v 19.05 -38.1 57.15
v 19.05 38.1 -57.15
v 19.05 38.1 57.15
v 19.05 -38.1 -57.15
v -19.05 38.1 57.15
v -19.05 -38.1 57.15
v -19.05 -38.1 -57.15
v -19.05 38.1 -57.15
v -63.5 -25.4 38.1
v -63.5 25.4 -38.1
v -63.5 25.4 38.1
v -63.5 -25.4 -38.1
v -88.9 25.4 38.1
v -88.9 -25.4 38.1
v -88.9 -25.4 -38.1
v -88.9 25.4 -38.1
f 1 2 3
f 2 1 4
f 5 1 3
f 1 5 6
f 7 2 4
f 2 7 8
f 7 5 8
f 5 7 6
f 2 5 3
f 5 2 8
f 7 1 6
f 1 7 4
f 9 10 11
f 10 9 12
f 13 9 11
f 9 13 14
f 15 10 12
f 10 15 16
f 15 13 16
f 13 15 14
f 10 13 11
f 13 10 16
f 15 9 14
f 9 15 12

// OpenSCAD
// file: ../lib/TOGUnitTable-v1.scad
// TOGUnitTable-v1.0.0 - Library for handling 'complex amounts' in the form of [multiplier, unit name], e.g. [1.5, "inch"]
//
// 2023-07-01: the following 'annotation' is something I just made up,
// but is intended as a way for future packaging tools to know that it's 'safe'
// (because everything has been somewhat namespaced) to turn a `use <x>`
// into an `include <x>`, making it inlinable:
// safe-to-include: true
// 
// Versions:
// v1.0.0:
// - Created it.
// 
// Naming convention:
// Doing 'OO without classes', here.
// Fully qualified name = class or package name + "__" + member name
// Class or package name may itself be namespaced, and class names may double as package names.
// Here, tog_unittable names both a class and a package.

// Demo unit table uses 'micrometer' as the base unit
// in order to keep multipliers as integers as much as possible.
tog_unittable__demo_unit_table = [
	["um",    [    1   ,   "um"], "micrometer" ],
	["mm",    [ 1000   ,   "um"], "millimeter" ],
	["inch",  [25400   ,   "um"], "inch"       ],
	["u",     [    1/16, "inch"], "model unit" ], // As used by TGx9 et al
	["atom",  [    8   ,    "u"], "model atom" ],
	["chunk", [    3   , "atom"], "model chunk"],
];

function tog_unittable__list__filter(list, predicate) = [
	for( item=list ) if( predicate(item) ) item
];
function tog_unittable__list__first(list, on_error) =
	len(list) > 0 ? list[0] : on_error();

function tog_unittable__unit_value_ca(unit_table, unit_name) =
	tog_unittable__list__first(
		tog_unittable__list__filter(unit_table, function (entry) entry[0] == unit_name),
		function () assert(false, str("Did not find entry for unit '", unit_name, "' in unit table")))[1];

function tog_unittable__ca__is_valid( ca ) =
	is_list(ca) && len(ca) == 2;

// Break down 'amount' until it is in a base unit (one which is defined in terms of itself)
function tog_unittable__simplify_ca(unit_table, amount) =
	assert( tog_unittable__ca__is_valid(amount), str(amount, " is not a valid Complex Amount (should be [numeric_value, \"unit_name\"])") )
	let( unit_value_ca = tog_unittable__unit_value_ca(unit_table, amount[1]) )
	unit_value_ca[1] == amount[1] ? amount :
		tog_unittable__simplify_ca(unit_table, [amount[0] * unit_value_ca[0], unit_value_ca[1]]);

function tog_unittable__divide_ca(unit_table, numerator, denominator) =
	let(
		numerator_base_ca   = tog_unittable__simplify_ca(unit_table, numerator),
		denominator_base_ca = tog_unittable__simplify_ca(unit_table, denominator)
	)
	assert(numerator_base_ca[1] == denominator_base_ca[1], str("Different base units found for ", numerator[1], " and ", denominator[1]))
	numerator_base_ca[0] / denominator_base_ca[0];	

assert(tog_unittable__divide_ca(tog_unittable__demo_unit_table, [1,   "mm"], [  1, "mm"]) ==     1   );
assert(tog_unittable__divide_ca(tog_unittable__demo_unit_table, [1,   "mm"], [  1, "um"]) ==  1000   );
assert(tog_unittable__divide_ca(tog_unittable__demo_unit_table, [1, "inch"], [  1, "um"]) == 25400   );
assert(tog_unittable__divide_ca(tog_unittable__demo_unit_table, [1, "inch"], [  1, "mm"]) ==    25.4 );
assert(tog_unittable__divide_ca(tog_unittable__demo_unit_table, [1, "inch"], [254, "um"]) ==   100   );
assert(tog_unittable__divide_ca(tog_unittable__demo_unit_table, [1,    "u"], [  1, "um"]) ==  1587.5 );
// file: ../lib/TOGridPileLib-v3.scad
// TOGridPileLib-v3
//
// HOKAY WHAT ARE THE COMMON
// things that I want the library to do?
// 
// - [X] Be `include`-able, to make inlining easy
// - [X] Allow unit table to be overridden easily, but default by default
// - [ ] Support common configurations by name (e.g. "V9", or some "WSTYPE-...")
//   without having to pass 50 different parameters in
// - [ ] Make a simple foot-only block that I can subtract stuff from
//   params: foot style
// - [ ] Make a block with a lip
// - [ ] Make a block foot, and I'll intersect it with some other things
// - [X] Translate a block_size_ca to mm

use <../lib/TOGUnitTable-v1.scad>

function togridpile3_map(arr, fn) = [ for(item=arr) fn(item) ];

togridpile3_default_unit_table = [
	["um",    [    1,               "um"]],
	["mm",    [ 1000,               "um"]],
	["inch",  [25400,               "um"]],
	["u",     [    1.5875,          "mm"]],
	["atom",  [    8,                "u"]],
	["chunk", [    3,             "atom"]],
	["tgp-standard-bevel"   , [2,    "u"]], // Usuually 1/8"
	["m-outer-corner-radius", [4,    "u"]],
	["f-outer-corner-radius", [3,    "u"]],
];

function togridpile3_get_default_unit_table() = togridpile3_default_unit_table;
function togridpile3_get_unit_table() = is_undef($togridpile3_unit_table) ? togridpile3_default_unit_table : $togridpile3_unit_table;

function togridpile3_decode_size(size) =
	let( unit_table = togridpile3_get_unit_table() )
	togridpile3_map(size, function(dim) is_num(dim) ? dim : tog_unittable__divide_ca(unit_table, dim, [1, "mm"]));

module togridpile3_cube(size, offset=0) {
	cube(togridpile3_decode_size(size), center=true);
}
// main file
include <../lib/TOGridPileLib-v3.scad>

alternate_unit_table = [
	["chunk", [2, "atom"]],
	each togridpile3_get_default_unit_table()
];

// Using default unit table (may give a warning):
togridpile3_cube(
	[[1, "chunk"], [2, "chunk"], [3, "chunk"]]
);

// Using explicit unit table
translate([-76.2, 0, 0]) togridpile3_cube(
	[[1, "chunk"], [2, "chunk"], [3, "chunk"]],
	$togridpile3_unit_table = alternate_unit_table
);
